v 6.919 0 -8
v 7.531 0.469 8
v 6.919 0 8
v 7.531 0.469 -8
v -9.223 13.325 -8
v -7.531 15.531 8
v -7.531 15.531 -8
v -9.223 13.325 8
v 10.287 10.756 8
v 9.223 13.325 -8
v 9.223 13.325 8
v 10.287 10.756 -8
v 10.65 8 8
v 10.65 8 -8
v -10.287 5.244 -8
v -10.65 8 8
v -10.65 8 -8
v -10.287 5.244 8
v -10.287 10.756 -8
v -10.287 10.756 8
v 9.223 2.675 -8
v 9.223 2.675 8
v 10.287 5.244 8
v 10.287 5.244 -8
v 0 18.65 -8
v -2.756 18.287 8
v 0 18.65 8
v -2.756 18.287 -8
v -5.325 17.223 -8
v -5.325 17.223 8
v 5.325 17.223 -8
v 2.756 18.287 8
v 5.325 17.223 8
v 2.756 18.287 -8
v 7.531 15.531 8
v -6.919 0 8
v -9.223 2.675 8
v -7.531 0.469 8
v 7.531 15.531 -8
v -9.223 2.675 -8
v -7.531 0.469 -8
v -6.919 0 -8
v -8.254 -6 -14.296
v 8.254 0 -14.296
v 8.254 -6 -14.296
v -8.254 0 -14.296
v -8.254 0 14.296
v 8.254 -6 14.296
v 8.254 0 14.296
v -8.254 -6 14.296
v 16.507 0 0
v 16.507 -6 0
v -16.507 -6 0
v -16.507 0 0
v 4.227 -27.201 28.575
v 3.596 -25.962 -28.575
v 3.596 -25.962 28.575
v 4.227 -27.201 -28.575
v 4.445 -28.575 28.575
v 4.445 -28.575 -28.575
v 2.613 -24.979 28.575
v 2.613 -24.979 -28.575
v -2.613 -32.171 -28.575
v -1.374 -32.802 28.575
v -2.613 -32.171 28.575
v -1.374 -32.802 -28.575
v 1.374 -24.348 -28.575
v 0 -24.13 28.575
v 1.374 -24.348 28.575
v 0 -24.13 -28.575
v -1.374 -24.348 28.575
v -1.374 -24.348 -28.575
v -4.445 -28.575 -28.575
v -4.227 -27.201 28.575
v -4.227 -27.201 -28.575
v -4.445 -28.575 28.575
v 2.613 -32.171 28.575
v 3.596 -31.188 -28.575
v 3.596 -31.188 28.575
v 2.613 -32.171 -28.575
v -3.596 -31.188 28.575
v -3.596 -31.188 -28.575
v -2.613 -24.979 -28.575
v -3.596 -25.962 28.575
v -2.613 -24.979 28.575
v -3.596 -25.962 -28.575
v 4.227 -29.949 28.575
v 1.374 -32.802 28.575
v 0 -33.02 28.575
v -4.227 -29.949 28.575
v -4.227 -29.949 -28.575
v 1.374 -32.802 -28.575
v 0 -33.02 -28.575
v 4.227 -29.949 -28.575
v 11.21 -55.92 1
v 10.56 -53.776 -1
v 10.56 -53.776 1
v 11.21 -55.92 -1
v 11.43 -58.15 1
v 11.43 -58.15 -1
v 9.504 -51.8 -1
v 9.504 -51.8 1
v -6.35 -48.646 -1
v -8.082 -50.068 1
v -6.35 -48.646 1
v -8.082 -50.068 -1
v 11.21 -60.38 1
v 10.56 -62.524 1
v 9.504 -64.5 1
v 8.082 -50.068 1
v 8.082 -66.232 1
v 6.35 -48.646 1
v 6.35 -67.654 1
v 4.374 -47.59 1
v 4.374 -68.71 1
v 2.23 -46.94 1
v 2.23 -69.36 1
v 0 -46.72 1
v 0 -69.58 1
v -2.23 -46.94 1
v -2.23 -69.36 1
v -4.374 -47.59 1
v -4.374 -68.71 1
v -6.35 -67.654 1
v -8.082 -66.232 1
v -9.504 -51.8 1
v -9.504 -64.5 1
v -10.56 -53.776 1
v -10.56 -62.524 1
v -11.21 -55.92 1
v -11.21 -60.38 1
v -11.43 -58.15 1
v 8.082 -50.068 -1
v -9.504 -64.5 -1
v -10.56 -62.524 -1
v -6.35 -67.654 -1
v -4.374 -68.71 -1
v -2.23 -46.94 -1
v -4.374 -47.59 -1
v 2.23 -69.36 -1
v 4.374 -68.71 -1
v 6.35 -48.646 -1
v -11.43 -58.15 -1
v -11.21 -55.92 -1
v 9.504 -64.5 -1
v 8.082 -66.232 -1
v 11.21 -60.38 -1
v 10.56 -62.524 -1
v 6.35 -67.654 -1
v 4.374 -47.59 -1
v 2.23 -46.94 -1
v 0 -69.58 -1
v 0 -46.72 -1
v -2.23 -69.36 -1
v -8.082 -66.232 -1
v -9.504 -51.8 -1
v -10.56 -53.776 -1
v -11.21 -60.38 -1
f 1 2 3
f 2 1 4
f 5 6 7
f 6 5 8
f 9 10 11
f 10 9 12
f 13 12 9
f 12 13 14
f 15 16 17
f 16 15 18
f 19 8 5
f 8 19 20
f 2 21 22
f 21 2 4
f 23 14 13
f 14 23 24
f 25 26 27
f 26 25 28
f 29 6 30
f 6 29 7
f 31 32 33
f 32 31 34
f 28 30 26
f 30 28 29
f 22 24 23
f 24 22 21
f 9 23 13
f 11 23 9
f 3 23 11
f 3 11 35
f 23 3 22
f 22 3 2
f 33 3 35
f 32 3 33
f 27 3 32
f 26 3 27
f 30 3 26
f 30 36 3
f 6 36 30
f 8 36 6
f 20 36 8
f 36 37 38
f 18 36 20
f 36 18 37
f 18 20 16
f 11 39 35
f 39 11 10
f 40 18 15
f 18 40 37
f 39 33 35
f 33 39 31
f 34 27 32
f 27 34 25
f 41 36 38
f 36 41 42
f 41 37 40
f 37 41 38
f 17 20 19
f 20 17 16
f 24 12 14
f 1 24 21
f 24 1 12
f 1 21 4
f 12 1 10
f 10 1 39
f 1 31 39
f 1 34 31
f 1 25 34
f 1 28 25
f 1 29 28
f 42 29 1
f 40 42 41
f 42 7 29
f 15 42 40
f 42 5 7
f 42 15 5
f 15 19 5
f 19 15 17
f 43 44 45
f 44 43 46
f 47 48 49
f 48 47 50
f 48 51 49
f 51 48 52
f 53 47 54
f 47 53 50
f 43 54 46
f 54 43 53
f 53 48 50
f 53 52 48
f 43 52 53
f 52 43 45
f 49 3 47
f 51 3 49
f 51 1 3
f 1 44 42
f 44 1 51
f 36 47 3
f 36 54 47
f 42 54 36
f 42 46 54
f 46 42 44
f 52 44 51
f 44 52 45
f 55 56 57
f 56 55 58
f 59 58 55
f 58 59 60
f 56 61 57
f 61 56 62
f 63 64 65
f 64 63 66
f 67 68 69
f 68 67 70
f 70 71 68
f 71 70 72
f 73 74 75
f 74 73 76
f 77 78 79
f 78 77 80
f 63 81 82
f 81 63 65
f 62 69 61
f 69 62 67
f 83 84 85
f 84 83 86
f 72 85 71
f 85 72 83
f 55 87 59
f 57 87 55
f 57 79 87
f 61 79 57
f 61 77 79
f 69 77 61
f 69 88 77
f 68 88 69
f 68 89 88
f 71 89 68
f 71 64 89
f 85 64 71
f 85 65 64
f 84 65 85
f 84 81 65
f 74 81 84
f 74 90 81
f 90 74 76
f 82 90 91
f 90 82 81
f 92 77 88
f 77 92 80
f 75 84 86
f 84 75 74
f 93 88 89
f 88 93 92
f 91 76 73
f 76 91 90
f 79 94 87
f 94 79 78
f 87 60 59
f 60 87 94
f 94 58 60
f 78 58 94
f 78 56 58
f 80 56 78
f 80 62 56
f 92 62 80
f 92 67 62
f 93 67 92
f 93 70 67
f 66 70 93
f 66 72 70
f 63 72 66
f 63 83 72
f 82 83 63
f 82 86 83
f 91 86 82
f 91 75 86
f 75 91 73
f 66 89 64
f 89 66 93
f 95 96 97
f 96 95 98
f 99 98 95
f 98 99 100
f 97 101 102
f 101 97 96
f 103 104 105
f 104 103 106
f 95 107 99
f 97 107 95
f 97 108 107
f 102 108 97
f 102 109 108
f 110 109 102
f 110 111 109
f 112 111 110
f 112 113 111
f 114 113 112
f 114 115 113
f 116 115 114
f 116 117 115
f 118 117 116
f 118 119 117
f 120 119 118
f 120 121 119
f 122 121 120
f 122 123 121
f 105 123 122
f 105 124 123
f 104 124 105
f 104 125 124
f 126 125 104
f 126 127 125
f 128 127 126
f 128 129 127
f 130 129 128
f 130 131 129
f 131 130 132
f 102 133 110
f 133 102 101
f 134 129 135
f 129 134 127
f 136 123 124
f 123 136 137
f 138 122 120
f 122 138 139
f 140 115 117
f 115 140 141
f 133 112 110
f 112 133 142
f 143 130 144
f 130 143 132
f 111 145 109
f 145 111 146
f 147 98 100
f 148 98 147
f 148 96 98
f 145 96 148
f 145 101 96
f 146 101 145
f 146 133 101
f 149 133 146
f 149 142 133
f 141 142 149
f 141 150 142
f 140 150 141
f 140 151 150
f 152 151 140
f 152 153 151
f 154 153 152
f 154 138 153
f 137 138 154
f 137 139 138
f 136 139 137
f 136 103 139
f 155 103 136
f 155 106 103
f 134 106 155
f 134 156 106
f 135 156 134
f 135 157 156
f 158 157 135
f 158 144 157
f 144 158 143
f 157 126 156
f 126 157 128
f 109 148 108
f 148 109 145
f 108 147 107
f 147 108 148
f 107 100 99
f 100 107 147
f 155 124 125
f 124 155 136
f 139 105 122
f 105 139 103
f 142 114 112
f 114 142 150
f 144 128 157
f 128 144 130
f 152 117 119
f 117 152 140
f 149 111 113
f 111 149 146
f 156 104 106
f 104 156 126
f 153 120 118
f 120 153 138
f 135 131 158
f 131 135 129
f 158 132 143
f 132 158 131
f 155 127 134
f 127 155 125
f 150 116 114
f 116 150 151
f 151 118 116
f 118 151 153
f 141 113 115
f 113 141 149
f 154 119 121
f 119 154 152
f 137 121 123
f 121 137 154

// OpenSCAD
// Auto-generated by scripts/author_from_manifest.py (Phase D.3).
// Source: data/phase_d_manifest.json (sku_intent='tyco-rfii-concealed-175f').
// Do not hand-edit — regenerate from the manifest.
//
// @part tyco_rfii_concealed_175f
// @kind sprinkler_head
// @category head.pendant.k49
// @display-name "Tyco RFII Concealed Residential K4.9 175°F"
// @mfg tyco_fire_protection
// @mfg-pn RFII-C
// @listing UL FM
// @hazard-classes LH
// @price-usd 28.75
// @install-minutes 10
// @crew journeyman
// @k-factor 4.9
// @orientation pendant
// @response quick
// @temperature 175F
// @param size_in number default=0.5 label="Size" unit="in"
// @port inlet position=[0,0.014,0] direction=[0,1,0] style=NPT_threaded size_in=0.5 role=drop

size_in = 0.5;
k_factor = 4.9;

length_mm   = 57.15;
body_dia_mm = 25.40;
thread_od   = 21.3;
thread_len  = 16;
deflector_d = body_dia_mm * 0.9;

 union() {
    translate([0, thread_len/2, 0])
        cylinder(h = thread_len, d = thread_od, center = true, $fn = 24);
    translate([0, -3, 0])
        rotate([90, 0, 0])
        cylinder(h = 6, d = thread_od * 1.55, $fn = 6, center = true);
    translate([0, -length_mm/2, 0])
        cylinder(h = length_mm, d = body_dia_mm * 0.35, center = true, $fn = 20);
    translate([0, -length_mm - 1, 0])
        cylinder(h = 2, d = deflector_d, center = true, $fn = 32);
}
